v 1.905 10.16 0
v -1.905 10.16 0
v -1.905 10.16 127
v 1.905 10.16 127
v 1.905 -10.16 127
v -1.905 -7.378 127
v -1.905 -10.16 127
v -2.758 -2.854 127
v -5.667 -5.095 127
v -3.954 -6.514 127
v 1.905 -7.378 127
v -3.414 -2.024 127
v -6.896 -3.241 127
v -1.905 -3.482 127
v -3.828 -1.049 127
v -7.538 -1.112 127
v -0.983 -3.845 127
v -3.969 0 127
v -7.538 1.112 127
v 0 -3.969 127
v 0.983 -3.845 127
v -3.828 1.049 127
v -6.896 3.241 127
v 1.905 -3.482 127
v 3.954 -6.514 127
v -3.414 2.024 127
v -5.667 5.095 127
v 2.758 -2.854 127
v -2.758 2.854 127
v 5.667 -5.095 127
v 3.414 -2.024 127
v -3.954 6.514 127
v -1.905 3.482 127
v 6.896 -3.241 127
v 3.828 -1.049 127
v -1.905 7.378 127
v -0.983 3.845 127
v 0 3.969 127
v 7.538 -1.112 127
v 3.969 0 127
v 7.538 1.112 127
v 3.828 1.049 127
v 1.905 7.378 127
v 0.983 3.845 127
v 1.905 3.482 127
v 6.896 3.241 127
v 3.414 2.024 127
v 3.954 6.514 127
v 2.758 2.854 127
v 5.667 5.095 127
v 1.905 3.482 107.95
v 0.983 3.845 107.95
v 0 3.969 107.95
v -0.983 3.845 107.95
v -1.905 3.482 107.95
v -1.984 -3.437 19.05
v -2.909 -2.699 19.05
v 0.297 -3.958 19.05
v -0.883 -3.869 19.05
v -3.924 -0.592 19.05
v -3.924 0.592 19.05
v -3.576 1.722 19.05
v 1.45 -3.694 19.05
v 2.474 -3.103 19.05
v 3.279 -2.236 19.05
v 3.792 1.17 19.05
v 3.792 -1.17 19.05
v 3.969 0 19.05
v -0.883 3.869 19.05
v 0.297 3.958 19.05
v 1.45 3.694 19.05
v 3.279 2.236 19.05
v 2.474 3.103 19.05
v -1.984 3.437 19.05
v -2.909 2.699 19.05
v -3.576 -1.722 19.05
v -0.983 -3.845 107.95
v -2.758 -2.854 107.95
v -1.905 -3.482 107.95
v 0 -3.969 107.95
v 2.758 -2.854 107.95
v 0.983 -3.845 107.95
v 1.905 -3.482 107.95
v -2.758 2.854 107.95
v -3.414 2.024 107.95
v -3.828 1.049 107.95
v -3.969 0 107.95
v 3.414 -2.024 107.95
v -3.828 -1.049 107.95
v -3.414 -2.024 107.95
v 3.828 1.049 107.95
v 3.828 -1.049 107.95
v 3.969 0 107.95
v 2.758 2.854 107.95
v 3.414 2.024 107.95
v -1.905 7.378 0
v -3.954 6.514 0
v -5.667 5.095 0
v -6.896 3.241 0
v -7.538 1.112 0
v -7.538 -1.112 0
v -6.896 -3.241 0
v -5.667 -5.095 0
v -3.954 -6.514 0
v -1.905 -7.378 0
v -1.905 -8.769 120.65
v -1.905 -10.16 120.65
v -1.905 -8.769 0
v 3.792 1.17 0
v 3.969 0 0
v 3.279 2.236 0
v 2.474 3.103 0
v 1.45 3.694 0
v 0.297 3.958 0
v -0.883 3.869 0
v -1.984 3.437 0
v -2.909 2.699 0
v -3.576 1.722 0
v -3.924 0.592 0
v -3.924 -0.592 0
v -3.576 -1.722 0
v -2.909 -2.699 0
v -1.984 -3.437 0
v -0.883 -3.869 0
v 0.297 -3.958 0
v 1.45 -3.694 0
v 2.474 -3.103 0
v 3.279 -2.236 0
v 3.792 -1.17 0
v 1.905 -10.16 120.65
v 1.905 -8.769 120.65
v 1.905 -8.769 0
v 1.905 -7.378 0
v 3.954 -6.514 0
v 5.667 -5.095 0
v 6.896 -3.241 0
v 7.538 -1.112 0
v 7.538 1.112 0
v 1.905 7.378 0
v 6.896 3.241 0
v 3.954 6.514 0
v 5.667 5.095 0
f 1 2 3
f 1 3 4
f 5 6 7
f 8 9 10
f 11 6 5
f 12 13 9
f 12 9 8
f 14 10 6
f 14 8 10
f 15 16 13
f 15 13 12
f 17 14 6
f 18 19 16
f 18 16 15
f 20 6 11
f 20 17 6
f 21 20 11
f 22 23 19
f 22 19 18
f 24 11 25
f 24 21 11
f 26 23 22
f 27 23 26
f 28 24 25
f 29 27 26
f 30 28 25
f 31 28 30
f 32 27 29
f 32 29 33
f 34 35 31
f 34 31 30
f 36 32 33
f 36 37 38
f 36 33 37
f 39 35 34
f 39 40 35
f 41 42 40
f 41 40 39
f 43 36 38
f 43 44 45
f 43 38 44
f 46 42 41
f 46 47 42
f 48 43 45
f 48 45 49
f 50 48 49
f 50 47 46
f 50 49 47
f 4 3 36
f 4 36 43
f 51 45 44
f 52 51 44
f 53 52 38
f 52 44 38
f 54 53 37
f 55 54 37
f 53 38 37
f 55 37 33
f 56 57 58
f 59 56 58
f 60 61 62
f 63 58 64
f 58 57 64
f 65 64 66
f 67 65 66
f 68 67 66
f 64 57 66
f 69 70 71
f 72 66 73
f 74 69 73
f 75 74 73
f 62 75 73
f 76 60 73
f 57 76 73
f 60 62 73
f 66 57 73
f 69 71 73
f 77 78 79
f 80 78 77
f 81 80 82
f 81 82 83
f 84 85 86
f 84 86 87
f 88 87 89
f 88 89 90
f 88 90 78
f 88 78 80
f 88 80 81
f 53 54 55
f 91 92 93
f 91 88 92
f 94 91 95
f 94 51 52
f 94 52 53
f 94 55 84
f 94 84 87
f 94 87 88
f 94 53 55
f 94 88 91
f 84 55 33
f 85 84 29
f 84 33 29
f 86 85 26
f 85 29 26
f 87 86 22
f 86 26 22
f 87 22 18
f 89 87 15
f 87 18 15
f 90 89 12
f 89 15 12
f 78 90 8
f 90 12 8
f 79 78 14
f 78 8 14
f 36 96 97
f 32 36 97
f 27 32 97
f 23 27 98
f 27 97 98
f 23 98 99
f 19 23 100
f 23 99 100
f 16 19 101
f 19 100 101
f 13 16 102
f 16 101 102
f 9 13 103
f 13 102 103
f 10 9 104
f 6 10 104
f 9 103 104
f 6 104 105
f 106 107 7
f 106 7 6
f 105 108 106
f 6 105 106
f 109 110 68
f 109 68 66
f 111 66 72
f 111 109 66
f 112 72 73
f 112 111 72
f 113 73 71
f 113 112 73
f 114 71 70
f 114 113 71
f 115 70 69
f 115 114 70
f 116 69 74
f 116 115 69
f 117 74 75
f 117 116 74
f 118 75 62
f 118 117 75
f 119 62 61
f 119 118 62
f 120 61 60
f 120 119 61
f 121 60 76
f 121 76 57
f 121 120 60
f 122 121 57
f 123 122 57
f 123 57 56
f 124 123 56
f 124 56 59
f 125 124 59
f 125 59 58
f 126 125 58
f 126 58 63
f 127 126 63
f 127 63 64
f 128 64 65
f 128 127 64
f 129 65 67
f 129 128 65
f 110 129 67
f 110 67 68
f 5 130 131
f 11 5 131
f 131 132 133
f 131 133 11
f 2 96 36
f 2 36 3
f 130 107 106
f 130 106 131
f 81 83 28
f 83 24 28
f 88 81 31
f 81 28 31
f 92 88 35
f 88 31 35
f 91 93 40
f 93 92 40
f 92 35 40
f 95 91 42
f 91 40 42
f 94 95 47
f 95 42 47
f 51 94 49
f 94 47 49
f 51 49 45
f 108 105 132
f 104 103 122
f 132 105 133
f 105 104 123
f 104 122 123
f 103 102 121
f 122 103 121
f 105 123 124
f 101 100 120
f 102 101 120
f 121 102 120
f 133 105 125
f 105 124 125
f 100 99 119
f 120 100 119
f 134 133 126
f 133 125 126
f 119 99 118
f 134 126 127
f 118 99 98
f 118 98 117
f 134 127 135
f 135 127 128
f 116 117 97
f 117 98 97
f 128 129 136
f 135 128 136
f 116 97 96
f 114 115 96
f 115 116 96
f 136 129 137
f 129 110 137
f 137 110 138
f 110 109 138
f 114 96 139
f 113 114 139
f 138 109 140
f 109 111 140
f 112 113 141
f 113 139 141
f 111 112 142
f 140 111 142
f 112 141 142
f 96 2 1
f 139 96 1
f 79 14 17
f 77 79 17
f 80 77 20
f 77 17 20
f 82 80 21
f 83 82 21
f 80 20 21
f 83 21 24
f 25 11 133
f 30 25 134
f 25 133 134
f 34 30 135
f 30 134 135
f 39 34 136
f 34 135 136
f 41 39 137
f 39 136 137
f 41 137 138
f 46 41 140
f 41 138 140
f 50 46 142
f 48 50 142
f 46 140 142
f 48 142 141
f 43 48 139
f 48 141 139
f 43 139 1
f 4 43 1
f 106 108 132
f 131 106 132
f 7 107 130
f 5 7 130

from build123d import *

# Parameters (mm, degrees)
F0_R      = 7.62
F1_DEPTH  = 127
F2_R      = 3.96875
F3_DEPTH  = 19.05
F4_W      = 3.81
F4_H      = 20.32
F5_DEPTH  = 127
F7_DEPTH  = 19.05
F8_R      = 3.96875
F9_DEPTH  = 19.05
F10_W     = 3.81
F10_H     = 1.3909833627
F11_DEPTH = 120.65


with BuildPart() as f1:
    # F0 (on Top) → F1 (new body)
    with BuildSketch(Plane.XY):
        Circle(F0_R)
    extrude(amount=F1_DEPTH)

    # F2 (on face) → F3 (cut)
    with BuildSketch(Plane.XY.offset(127)):
        Circle(F2_R)
    extrude(amount=-F3_DEPTH, mode=Mode.SUBTRACT)

    # F4 (on Top) → F5 (join)
    with BuildSketch(Plane.XY):
        Rectangle(F4_W, F4_H)
    extrude(amount=F5_DEPTH)

    # F6 (on face) → F7 (cut)
    with BuildSketch(Plane.XY.offset(127)):
        with BuildLine():
            Line((1.905, -3.4816593117), (1.905, 3.4816593117))
            ThreePointArc((1.905, 3.4816593117), (0, 3.96875), (-1.905, 3.4816593117))
            Line((-1.905, 3.4816593117), (-1.905, -3.4816593117))
            ThreePointArc((-1.905, -3.4816593117), (0, -3.96875), (1.905, -3.4816593117))
        make_face()
    extrude(amount=-F7_DEPTH, mode=Mode.SUBTRACT)

    # F8 (on Top) → F9 (cut)
    with BuildSketch(Plane.XY):
        Circle(F8_R)
    extrude(amount=F9_DEPTH, mode=Mode.SUBTRACT)

    # F10 (on face) → F11 (cut)
    with BuildSketch(Plane(origin=(0, 0, 0), x_dir=(1, 0, 0), z_dir=(0, 0, -1))):
        with Locations((0, 9.4645083186)):
            Rectangle(F10_W, F10_H)
    extrude(amount=-F11_DEPTH, mode=Mode.SUBTRACT)


solid = f1.part
